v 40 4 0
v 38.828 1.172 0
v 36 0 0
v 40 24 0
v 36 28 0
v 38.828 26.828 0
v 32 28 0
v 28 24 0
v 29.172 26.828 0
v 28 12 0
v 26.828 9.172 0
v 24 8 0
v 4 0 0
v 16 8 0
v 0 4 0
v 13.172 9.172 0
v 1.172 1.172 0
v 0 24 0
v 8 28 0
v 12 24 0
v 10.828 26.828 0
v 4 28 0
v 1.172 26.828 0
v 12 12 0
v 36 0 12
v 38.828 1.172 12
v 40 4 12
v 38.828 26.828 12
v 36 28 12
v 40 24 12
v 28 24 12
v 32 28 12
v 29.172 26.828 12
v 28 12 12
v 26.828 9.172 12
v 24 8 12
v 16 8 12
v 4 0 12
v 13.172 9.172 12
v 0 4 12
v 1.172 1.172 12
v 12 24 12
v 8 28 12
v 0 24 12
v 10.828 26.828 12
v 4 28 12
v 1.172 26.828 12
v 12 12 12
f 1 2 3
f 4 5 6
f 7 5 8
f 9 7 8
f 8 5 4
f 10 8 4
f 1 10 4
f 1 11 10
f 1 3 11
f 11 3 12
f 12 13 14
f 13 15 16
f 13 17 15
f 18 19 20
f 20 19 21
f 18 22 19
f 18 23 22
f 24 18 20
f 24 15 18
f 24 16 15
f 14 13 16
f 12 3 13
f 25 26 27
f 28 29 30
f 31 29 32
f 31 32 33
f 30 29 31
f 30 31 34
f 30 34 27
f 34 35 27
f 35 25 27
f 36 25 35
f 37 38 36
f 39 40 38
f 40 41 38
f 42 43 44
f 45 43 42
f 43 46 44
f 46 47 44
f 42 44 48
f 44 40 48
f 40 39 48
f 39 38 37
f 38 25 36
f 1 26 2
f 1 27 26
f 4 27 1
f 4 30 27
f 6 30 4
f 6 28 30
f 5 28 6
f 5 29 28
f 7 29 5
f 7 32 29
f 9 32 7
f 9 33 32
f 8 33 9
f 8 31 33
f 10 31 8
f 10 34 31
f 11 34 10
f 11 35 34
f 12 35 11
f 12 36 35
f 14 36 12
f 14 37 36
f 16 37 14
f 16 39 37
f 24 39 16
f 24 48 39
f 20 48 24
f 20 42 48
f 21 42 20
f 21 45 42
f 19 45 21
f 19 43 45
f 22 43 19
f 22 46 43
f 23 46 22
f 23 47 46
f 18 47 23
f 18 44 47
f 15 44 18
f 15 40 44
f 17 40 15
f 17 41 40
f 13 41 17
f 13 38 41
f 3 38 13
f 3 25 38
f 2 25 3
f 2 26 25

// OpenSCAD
$fn = 32;

// ----------------------------------------------------------------------
// Eye lug: clevis, 12 mm thick
// ----------------------------------------------------------------------

// --- parameters (mm) ---
profile_height = 12;      // extrusion height
profile_points = 24;      // points of the closed outline

profile = [[0, 4], [1.172, 1.172], [4, 0], [36, 0], [38.828, 1.172], [40, 4], [40, 24], [38.828, 26.828], [36, 28], [32, 28], [29.172, 26.828], [28, 24], [28, 12], [26.828, 9.172], [24, 8], [16, 8], [13.172, 9.172], [12, 12], [12, 24], [10.828, 26.828], [8, 28], [4, 28], [1.172, 26.828], [0, 24]];  // single closed polygon, 24 points, counter clockwise

// --- the one profile operation ---
linear_extrude(height = profile_height) polygon(points = profile);
